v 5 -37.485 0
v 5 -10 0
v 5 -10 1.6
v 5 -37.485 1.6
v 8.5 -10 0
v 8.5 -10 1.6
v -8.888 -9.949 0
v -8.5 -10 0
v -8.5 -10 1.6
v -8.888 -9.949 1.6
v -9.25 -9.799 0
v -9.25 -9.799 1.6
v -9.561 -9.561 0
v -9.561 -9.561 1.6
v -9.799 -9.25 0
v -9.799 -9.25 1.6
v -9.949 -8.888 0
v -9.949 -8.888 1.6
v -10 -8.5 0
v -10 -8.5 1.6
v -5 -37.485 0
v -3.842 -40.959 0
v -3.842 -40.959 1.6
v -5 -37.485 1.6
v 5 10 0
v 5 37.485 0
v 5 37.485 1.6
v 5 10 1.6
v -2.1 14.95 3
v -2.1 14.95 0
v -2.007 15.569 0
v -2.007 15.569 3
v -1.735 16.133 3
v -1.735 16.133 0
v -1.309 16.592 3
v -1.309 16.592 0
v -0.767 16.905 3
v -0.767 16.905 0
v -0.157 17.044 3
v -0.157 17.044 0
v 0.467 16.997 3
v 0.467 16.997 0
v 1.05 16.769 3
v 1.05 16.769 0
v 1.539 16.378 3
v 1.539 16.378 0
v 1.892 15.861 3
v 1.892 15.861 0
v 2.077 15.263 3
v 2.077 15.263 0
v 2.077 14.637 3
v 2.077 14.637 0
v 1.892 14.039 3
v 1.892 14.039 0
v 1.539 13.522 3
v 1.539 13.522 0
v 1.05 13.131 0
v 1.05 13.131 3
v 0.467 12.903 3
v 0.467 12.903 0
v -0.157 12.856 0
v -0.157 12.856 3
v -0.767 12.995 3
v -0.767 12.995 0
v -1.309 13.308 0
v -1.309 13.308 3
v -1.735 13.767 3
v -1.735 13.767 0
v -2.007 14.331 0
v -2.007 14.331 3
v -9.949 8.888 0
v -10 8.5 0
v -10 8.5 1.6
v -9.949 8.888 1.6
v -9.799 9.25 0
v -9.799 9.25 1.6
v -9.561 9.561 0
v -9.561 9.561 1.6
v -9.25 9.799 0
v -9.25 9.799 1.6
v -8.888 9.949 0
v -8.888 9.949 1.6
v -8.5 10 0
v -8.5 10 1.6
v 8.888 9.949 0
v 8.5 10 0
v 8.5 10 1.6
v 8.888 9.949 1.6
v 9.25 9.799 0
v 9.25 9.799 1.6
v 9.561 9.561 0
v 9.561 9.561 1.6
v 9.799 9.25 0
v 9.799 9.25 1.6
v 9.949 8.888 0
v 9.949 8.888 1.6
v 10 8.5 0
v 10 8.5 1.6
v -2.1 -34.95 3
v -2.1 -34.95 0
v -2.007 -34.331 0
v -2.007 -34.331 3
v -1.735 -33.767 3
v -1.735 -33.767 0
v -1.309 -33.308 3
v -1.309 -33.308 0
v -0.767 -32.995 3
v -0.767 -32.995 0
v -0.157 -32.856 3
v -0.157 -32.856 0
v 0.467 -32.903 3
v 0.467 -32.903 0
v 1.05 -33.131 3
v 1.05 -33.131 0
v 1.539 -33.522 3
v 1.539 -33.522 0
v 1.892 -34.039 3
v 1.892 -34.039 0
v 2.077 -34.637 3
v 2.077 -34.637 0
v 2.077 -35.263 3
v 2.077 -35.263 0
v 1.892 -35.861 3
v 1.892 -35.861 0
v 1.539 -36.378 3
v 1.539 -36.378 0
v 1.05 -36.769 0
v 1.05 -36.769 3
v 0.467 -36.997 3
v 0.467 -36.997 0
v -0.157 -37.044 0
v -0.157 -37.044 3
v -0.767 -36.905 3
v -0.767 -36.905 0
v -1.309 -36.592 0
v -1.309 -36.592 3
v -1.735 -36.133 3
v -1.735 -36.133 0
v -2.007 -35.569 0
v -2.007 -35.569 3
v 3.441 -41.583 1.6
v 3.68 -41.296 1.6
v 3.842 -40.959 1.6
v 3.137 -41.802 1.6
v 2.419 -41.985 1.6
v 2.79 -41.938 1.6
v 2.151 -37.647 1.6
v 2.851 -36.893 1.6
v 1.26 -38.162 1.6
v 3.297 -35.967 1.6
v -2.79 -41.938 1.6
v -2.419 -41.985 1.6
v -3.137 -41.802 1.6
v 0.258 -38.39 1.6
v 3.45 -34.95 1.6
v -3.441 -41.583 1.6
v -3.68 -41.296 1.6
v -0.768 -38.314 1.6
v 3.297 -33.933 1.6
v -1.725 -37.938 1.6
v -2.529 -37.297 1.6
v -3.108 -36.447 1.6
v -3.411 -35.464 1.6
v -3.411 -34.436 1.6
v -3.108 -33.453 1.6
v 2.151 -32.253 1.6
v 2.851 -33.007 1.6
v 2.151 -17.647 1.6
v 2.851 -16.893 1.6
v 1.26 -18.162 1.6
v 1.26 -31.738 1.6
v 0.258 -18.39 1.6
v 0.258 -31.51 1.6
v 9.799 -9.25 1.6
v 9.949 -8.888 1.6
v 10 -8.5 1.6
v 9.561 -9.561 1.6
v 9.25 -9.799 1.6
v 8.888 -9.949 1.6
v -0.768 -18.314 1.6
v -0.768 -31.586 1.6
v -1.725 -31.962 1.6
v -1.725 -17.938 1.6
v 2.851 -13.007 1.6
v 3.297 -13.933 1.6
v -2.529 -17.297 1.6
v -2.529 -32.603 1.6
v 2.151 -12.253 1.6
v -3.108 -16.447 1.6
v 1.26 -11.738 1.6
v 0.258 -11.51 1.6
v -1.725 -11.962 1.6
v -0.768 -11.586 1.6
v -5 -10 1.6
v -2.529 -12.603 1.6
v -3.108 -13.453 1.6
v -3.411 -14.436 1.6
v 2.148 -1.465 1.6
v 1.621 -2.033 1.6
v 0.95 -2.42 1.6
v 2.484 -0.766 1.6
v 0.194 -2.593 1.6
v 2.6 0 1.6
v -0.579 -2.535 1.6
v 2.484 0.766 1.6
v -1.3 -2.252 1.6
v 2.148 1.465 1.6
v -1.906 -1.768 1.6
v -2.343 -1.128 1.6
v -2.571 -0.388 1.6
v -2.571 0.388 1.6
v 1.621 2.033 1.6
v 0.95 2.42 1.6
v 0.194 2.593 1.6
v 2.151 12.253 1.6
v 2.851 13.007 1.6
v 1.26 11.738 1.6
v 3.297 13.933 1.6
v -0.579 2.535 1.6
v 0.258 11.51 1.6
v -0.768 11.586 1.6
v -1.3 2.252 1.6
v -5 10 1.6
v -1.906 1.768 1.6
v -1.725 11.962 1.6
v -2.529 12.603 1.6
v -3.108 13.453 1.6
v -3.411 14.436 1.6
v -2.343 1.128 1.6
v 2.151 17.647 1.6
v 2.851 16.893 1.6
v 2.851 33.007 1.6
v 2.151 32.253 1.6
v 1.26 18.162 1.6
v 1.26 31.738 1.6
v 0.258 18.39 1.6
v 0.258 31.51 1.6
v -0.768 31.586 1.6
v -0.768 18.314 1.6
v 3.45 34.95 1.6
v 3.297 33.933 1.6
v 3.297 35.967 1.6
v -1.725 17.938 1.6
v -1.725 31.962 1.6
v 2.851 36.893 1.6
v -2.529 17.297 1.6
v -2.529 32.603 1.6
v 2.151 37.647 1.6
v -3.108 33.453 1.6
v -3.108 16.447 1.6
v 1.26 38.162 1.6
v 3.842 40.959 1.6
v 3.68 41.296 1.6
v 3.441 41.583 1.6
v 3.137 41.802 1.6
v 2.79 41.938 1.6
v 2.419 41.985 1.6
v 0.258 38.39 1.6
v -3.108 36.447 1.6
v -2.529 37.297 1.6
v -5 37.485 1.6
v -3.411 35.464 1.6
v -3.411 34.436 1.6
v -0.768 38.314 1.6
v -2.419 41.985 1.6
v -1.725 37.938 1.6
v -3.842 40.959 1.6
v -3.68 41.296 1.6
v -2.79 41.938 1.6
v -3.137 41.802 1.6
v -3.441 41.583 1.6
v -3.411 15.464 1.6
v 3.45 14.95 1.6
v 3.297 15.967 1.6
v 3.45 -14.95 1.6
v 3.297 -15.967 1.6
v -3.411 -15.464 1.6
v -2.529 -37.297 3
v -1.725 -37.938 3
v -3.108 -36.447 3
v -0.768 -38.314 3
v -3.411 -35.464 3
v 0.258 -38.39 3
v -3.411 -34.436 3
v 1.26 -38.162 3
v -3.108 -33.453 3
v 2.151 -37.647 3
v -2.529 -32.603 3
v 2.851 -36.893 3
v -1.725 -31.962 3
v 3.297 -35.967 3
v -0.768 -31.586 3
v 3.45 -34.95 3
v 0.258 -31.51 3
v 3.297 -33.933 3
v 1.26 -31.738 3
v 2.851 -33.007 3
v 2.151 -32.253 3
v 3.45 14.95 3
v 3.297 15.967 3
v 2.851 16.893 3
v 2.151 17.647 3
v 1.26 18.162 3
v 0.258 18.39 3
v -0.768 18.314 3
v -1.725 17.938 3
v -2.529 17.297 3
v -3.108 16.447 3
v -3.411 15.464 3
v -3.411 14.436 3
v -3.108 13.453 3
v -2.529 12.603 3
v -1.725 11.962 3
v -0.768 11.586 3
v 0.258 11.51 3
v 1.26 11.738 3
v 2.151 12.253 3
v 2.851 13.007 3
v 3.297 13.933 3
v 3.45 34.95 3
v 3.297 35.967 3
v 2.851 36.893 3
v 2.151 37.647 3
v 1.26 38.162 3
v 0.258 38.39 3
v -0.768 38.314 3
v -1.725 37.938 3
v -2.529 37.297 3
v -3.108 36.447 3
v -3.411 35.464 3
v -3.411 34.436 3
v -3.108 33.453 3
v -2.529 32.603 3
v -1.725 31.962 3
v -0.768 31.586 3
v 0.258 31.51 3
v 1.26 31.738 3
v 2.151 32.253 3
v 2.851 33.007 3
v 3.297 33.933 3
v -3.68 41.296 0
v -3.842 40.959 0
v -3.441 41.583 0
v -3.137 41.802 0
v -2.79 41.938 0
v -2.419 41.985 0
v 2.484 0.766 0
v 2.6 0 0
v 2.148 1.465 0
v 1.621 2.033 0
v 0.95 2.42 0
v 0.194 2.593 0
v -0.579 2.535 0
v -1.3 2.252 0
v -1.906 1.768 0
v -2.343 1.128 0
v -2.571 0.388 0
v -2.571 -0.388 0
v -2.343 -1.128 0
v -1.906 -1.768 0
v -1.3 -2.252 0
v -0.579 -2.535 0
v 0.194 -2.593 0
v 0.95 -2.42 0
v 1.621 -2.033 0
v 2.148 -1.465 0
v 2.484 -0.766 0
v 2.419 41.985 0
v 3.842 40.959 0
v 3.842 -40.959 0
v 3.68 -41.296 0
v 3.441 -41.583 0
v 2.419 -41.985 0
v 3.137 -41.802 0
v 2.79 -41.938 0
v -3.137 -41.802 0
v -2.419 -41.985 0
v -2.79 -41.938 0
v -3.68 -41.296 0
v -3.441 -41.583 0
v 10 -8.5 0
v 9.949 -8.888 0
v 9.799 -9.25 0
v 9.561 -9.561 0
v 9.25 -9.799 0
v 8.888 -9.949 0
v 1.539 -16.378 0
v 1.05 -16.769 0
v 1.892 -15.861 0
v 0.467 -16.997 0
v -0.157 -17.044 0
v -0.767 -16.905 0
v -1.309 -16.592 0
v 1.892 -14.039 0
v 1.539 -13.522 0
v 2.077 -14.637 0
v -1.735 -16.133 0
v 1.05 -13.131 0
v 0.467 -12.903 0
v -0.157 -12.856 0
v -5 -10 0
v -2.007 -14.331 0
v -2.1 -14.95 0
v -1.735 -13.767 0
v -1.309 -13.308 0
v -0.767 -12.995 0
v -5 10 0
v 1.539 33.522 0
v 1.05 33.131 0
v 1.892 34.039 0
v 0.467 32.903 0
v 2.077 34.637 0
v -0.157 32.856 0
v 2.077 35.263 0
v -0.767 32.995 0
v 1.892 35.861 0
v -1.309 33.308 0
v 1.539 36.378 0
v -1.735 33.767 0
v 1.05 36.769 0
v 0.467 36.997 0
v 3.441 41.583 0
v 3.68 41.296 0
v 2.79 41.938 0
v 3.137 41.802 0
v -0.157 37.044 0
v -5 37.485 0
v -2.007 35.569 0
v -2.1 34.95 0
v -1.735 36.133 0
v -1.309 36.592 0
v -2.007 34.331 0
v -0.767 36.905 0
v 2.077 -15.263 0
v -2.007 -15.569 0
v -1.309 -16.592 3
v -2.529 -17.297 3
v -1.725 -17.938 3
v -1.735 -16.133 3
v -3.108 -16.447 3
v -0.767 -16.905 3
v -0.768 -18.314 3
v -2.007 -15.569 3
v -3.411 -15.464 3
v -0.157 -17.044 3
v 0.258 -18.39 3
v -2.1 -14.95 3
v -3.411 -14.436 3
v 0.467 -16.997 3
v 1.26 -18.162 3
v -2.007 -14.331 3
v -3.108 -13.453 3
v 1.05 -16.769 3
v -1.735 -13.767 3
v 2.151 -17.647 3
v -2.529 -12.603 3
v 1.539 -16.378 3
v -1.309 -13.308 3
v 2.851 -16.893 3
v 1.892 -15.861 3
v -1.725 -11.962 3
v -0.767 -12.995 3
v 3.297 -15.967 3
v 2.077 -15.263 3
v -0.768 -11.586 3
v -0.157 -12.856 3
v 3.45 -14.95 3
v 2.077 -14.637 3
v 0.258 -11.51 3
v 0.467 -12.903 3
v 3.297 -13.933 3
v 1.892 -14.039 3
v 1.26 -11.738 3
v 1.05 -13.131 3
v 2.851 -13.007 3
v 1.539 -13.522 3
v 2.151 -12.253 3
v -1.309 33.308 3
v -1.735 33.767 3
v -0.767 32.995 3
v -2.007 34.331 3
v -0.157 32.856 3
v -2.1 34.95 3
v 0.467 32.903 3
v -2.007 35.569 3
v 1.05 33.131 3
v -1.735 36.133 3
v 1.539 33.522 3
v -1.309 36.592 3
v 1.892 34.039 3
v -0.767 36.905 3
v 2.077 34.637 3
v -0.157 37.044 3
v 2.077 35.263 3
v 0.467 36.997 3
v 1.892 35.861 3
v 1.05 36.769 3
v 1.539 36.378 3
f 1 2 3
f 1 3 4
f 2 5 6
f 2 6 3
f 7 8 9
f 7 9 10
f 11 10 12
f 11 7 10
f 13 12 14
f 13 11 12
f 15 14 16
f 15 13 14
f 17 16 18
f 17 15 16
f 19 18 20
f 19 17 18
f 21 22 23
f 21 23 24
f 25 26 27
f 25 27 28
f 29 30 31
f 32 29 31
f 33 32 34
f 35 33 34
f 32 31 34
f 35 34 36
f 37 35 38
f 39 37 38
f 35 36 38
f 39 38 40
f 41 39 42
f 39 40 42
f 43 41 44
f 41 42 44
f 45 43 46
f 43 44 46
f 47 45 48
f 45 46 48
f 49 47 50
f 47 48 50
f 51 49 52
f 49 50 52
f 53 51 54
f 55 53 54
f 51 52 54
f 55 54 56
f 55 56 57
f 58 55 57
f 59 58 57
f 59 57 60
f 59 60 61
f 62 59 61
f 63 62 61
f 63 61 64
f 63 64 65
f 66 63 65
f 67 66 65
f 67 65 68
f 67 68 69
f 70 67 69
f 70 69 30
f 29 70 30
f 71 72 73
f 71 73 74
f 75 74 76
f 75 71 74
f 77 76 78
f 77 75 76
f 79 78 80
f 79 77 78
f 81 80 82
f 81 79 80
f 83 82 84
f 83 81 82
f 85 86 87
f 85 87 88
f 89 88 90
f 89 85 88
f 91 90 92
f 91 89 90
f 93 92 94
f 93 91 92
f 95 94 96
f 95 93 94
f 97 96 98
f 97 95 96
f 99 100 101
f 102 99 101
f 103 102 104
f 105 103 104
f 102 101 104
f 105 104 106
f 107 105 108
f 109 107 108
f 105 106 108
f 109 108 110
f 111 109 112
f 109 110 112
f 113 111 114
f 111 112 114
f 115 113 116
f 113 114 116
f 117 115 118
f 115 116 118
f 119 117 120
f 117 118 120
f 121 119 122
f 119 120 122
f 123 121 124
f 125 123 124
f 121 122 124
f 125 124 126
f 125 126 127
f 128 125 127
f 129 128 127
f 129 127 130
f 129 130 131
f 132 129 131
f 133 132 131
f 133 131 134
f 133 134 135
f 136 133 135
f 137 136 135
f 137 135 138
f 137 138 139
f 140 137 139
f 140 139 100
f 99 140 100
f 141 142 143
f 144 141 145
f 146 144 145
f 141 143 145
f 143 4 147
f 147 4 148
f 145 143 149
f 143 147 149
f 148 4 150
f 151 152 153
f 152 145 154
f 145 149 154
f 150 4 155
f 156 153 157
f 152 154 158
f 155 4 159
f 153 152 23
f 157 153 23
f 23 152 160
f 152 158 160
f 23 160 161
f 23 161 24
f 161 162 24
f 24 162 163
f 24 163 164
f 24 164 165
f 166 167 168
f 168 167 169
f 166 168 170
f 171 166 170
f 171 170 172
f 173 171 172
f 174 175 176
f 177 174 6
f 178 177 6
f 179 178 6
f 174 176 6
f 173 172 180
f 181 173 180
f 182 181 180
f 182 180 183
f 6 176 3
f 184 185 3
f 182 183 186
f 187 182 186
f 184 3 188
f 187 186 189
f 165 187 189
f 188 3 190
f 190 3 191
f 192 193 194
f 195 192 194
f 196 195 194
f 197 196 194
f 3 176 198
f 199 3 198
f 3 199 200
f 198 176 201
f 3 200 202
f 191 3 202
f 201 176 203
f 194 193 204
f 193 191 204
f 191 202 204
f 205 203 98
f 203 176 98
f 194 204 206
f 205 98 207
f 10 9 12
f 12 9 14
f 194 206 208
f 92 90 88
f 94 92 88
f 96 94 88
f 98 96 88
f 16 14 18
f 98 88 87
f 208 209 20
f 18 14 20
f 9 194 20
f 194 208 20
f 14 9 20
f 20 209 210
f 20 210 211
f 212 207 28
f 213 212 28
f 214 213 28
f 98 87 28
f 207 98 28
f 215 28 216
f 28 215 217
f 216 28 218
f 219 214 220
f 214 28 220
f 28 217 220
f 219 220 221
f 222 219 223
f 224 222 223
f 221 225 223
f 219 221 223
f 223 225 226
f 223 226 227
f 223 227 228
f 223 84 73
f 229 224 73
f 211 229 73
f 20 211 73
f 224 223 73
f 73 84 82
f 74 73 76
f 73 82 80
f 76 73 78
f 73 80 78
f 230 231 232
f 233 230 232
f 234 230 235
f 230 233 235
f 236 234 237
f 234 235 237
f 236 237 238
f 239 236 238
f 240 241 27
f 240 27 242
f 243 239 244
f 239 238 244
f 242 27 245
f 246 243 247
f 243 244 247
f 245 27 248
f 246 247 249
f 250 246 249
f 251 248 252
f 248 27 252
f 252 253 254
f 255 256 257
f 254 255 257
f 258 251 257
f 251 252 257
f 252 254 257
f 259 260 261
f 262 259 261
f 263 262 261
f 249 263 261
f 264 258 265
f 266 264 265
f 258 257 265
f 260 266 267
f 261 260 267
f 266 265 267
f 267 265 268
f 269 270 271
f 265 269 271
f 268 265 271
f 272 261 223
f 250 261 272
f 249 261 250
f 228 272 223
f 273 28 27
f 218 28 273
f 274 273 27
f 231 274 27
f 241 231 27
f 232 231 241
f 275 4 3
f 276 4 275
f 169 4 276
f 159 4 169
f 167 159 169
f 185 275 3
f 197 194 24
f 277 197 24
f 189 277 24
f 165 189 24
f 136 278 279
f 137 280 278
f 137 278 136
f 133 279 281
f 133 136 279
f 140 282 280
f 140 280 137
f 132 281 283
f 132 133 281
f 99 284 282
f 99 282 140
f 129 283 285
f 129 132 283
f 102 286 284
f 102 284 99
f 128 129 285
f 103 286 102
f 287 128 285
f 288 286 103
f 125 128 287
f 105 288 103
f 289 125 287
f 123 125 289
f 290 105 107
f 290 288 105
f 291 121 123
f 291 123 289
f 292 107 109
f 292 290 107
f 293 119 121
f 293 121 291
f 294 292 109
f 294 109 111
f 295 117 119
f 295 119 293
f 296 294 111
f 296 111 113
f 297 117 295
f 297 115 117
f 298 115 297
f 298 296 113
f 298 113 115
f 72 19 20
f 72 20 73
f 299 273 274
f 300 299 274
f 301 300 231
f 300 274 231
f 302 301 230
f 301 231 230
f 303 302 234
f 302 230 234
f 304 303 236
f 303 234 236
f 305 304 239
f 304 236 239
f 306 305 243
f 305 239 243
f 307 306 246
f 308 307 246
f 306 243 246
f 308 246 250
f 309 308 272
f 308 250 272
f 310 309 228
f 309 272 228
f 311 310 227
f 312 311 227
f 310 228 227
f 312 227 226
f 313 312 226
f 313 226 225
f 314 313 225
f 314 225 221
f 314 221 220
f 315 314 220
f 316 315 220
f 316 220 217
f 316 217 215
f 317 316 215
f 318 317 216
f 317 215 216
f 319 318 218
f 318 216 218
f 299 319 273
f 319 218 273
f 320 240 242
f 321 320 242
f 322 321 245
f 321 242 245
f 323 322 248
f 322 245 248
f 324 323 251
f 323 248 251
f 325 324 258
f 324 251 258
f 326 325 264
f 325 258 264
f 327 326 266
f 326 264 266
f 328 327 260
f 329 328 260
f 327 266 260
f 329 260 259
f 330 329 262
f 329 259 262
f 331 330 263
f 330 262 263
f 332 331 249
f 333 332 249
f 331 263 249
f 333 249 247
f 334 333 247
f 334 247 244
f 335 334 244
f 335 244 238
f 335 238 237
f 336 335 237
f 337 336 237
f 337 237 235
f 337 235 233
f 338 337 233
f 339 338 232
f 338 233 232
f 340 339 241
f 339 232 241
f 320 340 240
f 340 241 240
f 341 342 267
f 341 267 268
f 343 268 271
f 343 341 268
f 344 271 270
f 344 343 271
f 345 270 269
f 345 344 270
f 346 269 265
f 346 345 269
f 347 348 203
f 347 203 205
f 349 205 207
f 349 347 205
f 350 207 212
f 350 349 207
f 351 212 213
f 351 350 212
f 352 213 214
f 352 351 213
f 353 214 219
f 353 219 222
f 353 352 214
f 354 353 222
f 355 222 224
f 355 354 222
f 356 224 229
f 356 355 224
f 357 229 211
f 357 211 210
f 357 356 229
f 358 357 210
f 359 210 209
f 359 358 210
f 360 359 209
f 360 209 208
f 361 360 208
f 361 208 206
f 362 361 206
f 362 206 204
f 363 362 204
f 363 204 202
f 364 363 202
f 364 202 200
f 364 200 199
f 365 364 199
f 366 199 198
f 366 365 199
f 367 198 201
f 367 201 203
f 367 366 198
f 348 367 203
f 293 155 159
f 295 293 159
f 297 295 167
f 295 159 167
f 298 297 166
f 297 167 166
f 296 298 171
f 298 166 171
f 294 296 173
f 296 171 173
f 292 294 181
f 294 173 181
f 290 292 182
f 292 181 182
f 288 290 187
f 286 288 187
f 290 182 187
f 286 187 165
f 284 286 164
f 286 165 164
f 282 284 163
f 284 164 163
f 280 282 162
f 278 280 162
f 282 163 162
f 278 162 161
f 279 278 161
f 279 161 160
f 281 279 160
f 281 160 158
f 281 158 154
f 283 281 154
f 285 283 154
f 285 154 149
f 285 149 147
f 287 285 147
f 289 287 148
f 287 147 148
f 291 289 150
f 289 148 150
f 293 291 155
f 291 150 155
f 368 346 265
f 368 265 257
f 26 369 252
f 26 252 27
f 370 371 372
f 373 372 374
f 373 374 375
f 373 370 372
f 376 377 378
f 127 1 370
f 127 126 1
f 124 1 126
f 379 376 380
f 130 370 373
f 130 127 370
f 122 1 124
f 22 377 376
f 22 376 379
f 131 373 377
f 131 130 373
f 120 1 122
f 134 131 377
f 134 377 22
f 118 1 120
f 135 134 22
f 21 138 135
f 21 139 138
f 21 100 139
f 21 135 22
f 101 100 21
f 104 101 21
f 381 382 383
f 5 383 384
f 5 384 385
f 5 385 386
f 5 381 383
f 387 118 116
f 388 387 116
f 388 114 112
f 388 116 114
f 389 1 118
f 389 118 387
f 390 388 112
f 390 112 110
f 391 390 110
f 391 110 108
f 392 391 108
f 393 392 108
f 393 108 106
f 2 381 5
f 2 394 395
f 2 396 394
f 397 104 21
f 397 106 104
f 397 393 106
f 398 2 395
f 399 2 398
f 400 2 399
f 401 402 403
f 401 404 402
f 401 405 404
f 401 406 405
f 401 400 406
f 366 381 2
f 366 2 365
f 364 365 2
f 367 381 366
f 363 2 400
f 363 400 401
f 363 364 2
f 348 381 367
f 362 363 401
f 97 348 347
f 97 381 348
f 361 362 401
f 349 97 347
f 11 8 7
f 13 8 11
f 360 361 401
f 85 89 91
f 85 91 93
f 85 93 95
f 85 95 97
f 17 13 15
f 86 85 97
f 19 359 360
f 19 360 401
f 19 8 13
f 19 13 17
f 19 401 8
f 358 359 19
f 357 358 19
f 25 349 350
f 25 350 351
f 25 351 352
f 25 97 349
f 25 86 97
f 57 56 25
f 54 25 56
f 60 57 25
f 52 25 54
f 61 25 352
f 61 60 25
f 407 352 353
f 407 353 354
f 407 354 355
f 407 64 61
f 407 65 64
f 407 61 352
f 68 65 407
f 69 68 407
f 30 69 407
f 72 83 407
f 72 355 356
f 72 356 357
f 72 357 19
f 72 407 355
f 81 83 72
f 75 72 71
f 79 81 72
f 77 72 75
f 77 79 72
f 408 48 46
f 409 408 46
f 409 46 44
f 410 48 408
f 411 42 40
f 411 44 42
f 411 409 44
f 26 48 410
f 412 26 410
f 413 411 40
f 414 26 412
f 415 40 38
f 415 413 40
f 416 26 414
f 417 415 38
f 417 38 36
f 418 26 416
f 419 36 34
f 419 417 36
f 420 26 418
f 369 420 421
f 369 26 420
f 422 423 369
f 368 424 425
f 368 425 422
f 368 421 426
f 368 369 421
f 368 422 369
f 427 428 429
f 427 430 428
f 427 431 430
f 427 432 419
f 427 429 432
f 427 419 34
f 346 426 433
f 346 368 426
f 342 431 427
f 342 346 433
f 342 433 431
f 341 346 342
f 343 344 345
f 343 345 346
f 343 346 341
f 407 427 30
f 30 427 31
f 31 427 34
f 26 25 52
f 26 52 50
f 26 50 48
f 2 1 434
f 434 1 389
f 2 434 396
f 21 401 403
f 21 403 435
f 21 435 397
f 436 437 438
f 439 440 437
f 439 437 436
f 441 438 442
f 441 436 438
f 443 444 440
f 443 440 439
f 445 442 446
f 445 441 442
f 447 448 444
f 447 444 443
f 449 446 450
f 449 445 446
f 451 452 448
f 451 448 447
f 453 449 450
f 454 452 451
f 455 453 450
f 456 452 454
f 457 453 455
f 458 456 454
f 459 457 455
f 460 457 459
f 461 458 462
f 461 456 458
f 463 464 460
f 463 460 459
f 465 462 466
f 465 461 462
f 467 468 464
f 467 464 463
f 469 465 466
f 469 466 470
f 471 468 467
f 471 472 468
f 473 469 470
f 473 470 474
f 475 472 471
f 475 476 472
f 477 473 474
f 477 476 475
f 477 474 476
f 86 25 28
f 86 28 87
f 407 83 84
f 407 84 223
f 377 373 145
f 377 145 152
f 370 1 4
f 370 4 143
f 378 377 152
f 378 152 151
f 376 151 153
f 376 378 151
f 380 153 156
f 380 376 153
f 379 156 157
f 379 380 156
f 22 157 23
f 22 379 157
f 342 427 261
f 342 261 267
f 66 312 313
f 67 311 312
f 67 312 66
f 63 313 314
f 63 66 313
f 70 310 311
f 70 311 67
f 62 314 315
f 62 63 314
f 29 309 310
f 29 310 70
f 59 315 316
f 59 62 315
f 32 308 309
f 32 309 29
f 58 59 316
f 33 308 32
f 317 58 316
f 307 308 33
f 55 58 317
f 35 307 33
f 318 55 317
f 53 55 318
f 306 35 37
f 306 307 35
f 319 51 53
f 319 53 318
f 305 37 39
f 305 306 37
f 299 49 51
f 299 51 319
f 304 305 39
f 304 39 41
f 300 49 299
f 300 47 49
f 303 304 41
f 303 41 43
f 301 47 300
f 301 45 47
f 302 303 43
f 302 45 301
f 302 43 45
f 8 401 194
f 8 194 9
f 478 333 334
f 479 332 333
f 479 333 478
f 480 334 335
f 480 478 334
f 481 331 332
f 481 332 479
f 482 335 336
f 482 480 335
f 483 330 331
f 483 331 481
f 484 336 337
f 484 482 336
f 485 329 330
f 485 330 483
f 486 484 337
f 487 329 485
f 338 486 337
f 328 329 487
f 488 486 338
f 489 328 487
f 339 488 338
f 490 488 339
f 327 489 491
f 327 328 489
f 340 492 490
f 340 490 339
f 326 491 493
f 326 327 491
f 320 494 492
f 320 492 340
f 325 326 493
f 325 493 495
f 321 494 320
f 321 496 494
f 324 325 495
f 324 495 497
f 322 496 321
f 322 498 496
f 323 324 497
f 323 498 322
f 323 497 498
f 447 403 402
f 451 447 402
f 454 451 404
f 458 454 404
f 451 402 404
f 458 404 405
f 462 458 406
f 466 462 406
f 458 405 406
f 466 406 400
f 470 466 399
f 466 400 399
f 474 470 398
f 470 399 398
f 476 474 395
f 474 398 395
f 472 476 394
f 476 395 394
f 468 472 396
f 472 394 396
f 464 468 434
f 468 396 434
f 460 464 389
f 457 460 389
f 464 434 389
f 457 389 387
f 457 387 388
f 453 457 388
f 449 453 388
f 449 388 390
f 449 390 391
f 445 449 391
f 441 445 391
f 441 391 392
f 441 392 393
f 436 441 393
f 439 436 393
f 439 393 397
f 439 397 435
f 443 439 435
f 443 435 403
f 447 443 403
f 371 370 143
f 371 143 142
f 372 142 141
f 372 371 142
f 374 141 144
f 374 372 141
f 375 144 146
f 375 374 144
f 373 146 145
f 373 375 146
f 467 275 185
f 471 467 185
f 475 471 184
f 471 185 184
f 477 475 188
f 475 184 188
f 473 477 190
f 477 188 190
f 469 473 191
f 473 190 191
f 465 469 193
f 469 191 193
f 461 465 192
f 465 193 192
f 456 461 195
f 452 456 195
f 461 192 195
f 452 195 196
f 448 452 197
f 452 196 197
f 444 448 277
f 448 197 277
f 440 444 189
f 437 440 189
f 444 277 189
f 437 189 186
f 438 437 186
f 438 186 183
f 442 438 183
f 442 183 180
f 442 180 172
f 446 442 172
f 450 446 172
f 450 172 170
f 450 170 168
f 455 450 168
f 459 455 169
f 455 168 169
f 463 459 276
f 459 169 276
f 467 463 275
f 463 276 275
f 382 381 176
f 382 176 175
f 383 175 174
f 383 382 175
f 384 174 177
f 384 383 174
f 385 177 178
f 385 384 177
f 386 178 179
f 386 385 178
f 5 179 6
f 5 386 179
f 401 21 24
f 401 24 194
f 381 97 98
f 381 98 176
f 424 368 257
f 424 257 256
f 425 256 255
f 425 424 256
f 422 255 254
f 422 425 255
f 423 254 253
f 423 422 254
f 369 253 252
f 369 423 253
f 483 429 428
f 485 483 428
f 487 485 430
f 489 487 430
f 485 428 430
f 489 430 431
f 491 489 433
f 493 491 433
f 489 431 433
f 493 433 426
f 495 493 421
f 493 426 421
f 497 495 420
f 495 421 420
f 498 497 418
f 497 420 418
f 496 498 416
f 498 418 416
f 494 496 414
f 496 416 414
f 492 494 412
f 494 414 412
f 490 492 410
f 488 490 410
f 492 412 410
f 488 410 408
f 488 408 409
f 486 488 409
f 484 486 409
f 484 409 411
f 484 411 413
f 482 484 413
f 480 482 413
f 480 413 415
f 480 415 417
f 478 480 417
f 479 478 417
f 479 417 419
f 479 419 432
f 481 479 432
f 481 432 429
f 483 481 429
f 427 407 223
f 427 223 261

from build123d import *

# Parameters (mm, degrees)
SKETCH1_R             = 2.6
BOSS_EXTRUDE1_DEPTH   = 1.6
SKETCH2_R             = 3.45
BOSS_EXTRUDE2_DEPTH   = 1.4
M5X0_8_TAPPED_HOLE1_D = 4.2


with BuildPart() as part:
    # Sketch1 → Boss-Extrude1 (new body)
    with BuildSketch(Plane.XY):
        with BuildLine():
            Line((-10, -8.5), (-10, 8.5))
            ThreePointArc((-10, 8.5), (-9.560660172, 9.560660172), (-8.5, 10))
            Line((-8.5, 10), (-5, 10))
            Line((-5, 10), (-5, 37.485))
            Line((-5, 37.485), (-3.841886117, 40.959341649))
            ThreePointArc((-3.841886117, 40.959341649), (-3.295926597, 41.701863278), (-2.41886117, 41.985))
            Line((-2.41886117, 41.985), (2.41886117, 41.985))
            ThreePointArc((2.41886117, 41.985), (3.295926597, 41.701863278), (3.841886117, 40.959341649))
            Line((3.841886117, 40.959341649), (5, 37.485))
            Line((5, 37.485), (5, 10))
            Line((5, 10), (8.5, 10))
            ThreePointArc((8.5, 10), (9.560660172, 9.560660172), (10, 8.5))
            Line((10, 8.5), (10, -8.5))
            ThreePointArc((10, -8.5), (9.560660172, -9.560660172), (8.5, -10))
            Line((8.5, -10), (5, -10))
            Line((5, -10), (5, -37.485))
            Line((5, -37.485), (3.841886117, -40.959341649))
            ThreePointArc((3.841886117, -40.959341649), (3.295926597, -41.701863278), (2.41886117, -41.985))
            Line((2.41886117, -41.985), (-2.41886117, -41.985))
            ThreePointArc((-2.41886117, -41.985), (-3.295926597, -41.701863278), (-3.841886117, -40.959341649))
            Line((-3.841886117, -40.959341649), (-5, -37.485))
            Line((-5, -37.485), (-5, -10))
            Line((-5, -10), (-8.5, -10))
            ThreePointArc((-8.5, -10), (-9.560660172, -9.560660172), (-10, -8.5))
        make_face()
        Circle(SKETCH1_R, mode=Mode.SUBTRACT)
    extrude(amount=BOSS_EXTRUDE1_DEPTH)

    # Sketch2 → Boss-Extrude2 (add)
    with BuildSketch(Plane.XY.offset(1.6)):
        with Locations((0, 14.95)):
            Circle(SKETCH2_R)
        with Locations((0, 34.95)):
            Circle(SKETCH2_R)
        with Locations((0, -14.95)):
            Circle(SKETCH2_R)
        with Locations((0, -34.95)):
            Circle(SKETCH2_R)
    extrude(amount=BOSS_EXTRUDE2_DEPTH)

    # M5x0.8 Tapped Hole1 (through all)
    with Locations(Plane.XY.offset(3)):
        with Locations((0, 34.95), (0, 14.95), (0, -14.95), (0, -34.95)):
            Hole(M5X0_8_TAPPED_HOLE1_D / 2)


solid = part.part
